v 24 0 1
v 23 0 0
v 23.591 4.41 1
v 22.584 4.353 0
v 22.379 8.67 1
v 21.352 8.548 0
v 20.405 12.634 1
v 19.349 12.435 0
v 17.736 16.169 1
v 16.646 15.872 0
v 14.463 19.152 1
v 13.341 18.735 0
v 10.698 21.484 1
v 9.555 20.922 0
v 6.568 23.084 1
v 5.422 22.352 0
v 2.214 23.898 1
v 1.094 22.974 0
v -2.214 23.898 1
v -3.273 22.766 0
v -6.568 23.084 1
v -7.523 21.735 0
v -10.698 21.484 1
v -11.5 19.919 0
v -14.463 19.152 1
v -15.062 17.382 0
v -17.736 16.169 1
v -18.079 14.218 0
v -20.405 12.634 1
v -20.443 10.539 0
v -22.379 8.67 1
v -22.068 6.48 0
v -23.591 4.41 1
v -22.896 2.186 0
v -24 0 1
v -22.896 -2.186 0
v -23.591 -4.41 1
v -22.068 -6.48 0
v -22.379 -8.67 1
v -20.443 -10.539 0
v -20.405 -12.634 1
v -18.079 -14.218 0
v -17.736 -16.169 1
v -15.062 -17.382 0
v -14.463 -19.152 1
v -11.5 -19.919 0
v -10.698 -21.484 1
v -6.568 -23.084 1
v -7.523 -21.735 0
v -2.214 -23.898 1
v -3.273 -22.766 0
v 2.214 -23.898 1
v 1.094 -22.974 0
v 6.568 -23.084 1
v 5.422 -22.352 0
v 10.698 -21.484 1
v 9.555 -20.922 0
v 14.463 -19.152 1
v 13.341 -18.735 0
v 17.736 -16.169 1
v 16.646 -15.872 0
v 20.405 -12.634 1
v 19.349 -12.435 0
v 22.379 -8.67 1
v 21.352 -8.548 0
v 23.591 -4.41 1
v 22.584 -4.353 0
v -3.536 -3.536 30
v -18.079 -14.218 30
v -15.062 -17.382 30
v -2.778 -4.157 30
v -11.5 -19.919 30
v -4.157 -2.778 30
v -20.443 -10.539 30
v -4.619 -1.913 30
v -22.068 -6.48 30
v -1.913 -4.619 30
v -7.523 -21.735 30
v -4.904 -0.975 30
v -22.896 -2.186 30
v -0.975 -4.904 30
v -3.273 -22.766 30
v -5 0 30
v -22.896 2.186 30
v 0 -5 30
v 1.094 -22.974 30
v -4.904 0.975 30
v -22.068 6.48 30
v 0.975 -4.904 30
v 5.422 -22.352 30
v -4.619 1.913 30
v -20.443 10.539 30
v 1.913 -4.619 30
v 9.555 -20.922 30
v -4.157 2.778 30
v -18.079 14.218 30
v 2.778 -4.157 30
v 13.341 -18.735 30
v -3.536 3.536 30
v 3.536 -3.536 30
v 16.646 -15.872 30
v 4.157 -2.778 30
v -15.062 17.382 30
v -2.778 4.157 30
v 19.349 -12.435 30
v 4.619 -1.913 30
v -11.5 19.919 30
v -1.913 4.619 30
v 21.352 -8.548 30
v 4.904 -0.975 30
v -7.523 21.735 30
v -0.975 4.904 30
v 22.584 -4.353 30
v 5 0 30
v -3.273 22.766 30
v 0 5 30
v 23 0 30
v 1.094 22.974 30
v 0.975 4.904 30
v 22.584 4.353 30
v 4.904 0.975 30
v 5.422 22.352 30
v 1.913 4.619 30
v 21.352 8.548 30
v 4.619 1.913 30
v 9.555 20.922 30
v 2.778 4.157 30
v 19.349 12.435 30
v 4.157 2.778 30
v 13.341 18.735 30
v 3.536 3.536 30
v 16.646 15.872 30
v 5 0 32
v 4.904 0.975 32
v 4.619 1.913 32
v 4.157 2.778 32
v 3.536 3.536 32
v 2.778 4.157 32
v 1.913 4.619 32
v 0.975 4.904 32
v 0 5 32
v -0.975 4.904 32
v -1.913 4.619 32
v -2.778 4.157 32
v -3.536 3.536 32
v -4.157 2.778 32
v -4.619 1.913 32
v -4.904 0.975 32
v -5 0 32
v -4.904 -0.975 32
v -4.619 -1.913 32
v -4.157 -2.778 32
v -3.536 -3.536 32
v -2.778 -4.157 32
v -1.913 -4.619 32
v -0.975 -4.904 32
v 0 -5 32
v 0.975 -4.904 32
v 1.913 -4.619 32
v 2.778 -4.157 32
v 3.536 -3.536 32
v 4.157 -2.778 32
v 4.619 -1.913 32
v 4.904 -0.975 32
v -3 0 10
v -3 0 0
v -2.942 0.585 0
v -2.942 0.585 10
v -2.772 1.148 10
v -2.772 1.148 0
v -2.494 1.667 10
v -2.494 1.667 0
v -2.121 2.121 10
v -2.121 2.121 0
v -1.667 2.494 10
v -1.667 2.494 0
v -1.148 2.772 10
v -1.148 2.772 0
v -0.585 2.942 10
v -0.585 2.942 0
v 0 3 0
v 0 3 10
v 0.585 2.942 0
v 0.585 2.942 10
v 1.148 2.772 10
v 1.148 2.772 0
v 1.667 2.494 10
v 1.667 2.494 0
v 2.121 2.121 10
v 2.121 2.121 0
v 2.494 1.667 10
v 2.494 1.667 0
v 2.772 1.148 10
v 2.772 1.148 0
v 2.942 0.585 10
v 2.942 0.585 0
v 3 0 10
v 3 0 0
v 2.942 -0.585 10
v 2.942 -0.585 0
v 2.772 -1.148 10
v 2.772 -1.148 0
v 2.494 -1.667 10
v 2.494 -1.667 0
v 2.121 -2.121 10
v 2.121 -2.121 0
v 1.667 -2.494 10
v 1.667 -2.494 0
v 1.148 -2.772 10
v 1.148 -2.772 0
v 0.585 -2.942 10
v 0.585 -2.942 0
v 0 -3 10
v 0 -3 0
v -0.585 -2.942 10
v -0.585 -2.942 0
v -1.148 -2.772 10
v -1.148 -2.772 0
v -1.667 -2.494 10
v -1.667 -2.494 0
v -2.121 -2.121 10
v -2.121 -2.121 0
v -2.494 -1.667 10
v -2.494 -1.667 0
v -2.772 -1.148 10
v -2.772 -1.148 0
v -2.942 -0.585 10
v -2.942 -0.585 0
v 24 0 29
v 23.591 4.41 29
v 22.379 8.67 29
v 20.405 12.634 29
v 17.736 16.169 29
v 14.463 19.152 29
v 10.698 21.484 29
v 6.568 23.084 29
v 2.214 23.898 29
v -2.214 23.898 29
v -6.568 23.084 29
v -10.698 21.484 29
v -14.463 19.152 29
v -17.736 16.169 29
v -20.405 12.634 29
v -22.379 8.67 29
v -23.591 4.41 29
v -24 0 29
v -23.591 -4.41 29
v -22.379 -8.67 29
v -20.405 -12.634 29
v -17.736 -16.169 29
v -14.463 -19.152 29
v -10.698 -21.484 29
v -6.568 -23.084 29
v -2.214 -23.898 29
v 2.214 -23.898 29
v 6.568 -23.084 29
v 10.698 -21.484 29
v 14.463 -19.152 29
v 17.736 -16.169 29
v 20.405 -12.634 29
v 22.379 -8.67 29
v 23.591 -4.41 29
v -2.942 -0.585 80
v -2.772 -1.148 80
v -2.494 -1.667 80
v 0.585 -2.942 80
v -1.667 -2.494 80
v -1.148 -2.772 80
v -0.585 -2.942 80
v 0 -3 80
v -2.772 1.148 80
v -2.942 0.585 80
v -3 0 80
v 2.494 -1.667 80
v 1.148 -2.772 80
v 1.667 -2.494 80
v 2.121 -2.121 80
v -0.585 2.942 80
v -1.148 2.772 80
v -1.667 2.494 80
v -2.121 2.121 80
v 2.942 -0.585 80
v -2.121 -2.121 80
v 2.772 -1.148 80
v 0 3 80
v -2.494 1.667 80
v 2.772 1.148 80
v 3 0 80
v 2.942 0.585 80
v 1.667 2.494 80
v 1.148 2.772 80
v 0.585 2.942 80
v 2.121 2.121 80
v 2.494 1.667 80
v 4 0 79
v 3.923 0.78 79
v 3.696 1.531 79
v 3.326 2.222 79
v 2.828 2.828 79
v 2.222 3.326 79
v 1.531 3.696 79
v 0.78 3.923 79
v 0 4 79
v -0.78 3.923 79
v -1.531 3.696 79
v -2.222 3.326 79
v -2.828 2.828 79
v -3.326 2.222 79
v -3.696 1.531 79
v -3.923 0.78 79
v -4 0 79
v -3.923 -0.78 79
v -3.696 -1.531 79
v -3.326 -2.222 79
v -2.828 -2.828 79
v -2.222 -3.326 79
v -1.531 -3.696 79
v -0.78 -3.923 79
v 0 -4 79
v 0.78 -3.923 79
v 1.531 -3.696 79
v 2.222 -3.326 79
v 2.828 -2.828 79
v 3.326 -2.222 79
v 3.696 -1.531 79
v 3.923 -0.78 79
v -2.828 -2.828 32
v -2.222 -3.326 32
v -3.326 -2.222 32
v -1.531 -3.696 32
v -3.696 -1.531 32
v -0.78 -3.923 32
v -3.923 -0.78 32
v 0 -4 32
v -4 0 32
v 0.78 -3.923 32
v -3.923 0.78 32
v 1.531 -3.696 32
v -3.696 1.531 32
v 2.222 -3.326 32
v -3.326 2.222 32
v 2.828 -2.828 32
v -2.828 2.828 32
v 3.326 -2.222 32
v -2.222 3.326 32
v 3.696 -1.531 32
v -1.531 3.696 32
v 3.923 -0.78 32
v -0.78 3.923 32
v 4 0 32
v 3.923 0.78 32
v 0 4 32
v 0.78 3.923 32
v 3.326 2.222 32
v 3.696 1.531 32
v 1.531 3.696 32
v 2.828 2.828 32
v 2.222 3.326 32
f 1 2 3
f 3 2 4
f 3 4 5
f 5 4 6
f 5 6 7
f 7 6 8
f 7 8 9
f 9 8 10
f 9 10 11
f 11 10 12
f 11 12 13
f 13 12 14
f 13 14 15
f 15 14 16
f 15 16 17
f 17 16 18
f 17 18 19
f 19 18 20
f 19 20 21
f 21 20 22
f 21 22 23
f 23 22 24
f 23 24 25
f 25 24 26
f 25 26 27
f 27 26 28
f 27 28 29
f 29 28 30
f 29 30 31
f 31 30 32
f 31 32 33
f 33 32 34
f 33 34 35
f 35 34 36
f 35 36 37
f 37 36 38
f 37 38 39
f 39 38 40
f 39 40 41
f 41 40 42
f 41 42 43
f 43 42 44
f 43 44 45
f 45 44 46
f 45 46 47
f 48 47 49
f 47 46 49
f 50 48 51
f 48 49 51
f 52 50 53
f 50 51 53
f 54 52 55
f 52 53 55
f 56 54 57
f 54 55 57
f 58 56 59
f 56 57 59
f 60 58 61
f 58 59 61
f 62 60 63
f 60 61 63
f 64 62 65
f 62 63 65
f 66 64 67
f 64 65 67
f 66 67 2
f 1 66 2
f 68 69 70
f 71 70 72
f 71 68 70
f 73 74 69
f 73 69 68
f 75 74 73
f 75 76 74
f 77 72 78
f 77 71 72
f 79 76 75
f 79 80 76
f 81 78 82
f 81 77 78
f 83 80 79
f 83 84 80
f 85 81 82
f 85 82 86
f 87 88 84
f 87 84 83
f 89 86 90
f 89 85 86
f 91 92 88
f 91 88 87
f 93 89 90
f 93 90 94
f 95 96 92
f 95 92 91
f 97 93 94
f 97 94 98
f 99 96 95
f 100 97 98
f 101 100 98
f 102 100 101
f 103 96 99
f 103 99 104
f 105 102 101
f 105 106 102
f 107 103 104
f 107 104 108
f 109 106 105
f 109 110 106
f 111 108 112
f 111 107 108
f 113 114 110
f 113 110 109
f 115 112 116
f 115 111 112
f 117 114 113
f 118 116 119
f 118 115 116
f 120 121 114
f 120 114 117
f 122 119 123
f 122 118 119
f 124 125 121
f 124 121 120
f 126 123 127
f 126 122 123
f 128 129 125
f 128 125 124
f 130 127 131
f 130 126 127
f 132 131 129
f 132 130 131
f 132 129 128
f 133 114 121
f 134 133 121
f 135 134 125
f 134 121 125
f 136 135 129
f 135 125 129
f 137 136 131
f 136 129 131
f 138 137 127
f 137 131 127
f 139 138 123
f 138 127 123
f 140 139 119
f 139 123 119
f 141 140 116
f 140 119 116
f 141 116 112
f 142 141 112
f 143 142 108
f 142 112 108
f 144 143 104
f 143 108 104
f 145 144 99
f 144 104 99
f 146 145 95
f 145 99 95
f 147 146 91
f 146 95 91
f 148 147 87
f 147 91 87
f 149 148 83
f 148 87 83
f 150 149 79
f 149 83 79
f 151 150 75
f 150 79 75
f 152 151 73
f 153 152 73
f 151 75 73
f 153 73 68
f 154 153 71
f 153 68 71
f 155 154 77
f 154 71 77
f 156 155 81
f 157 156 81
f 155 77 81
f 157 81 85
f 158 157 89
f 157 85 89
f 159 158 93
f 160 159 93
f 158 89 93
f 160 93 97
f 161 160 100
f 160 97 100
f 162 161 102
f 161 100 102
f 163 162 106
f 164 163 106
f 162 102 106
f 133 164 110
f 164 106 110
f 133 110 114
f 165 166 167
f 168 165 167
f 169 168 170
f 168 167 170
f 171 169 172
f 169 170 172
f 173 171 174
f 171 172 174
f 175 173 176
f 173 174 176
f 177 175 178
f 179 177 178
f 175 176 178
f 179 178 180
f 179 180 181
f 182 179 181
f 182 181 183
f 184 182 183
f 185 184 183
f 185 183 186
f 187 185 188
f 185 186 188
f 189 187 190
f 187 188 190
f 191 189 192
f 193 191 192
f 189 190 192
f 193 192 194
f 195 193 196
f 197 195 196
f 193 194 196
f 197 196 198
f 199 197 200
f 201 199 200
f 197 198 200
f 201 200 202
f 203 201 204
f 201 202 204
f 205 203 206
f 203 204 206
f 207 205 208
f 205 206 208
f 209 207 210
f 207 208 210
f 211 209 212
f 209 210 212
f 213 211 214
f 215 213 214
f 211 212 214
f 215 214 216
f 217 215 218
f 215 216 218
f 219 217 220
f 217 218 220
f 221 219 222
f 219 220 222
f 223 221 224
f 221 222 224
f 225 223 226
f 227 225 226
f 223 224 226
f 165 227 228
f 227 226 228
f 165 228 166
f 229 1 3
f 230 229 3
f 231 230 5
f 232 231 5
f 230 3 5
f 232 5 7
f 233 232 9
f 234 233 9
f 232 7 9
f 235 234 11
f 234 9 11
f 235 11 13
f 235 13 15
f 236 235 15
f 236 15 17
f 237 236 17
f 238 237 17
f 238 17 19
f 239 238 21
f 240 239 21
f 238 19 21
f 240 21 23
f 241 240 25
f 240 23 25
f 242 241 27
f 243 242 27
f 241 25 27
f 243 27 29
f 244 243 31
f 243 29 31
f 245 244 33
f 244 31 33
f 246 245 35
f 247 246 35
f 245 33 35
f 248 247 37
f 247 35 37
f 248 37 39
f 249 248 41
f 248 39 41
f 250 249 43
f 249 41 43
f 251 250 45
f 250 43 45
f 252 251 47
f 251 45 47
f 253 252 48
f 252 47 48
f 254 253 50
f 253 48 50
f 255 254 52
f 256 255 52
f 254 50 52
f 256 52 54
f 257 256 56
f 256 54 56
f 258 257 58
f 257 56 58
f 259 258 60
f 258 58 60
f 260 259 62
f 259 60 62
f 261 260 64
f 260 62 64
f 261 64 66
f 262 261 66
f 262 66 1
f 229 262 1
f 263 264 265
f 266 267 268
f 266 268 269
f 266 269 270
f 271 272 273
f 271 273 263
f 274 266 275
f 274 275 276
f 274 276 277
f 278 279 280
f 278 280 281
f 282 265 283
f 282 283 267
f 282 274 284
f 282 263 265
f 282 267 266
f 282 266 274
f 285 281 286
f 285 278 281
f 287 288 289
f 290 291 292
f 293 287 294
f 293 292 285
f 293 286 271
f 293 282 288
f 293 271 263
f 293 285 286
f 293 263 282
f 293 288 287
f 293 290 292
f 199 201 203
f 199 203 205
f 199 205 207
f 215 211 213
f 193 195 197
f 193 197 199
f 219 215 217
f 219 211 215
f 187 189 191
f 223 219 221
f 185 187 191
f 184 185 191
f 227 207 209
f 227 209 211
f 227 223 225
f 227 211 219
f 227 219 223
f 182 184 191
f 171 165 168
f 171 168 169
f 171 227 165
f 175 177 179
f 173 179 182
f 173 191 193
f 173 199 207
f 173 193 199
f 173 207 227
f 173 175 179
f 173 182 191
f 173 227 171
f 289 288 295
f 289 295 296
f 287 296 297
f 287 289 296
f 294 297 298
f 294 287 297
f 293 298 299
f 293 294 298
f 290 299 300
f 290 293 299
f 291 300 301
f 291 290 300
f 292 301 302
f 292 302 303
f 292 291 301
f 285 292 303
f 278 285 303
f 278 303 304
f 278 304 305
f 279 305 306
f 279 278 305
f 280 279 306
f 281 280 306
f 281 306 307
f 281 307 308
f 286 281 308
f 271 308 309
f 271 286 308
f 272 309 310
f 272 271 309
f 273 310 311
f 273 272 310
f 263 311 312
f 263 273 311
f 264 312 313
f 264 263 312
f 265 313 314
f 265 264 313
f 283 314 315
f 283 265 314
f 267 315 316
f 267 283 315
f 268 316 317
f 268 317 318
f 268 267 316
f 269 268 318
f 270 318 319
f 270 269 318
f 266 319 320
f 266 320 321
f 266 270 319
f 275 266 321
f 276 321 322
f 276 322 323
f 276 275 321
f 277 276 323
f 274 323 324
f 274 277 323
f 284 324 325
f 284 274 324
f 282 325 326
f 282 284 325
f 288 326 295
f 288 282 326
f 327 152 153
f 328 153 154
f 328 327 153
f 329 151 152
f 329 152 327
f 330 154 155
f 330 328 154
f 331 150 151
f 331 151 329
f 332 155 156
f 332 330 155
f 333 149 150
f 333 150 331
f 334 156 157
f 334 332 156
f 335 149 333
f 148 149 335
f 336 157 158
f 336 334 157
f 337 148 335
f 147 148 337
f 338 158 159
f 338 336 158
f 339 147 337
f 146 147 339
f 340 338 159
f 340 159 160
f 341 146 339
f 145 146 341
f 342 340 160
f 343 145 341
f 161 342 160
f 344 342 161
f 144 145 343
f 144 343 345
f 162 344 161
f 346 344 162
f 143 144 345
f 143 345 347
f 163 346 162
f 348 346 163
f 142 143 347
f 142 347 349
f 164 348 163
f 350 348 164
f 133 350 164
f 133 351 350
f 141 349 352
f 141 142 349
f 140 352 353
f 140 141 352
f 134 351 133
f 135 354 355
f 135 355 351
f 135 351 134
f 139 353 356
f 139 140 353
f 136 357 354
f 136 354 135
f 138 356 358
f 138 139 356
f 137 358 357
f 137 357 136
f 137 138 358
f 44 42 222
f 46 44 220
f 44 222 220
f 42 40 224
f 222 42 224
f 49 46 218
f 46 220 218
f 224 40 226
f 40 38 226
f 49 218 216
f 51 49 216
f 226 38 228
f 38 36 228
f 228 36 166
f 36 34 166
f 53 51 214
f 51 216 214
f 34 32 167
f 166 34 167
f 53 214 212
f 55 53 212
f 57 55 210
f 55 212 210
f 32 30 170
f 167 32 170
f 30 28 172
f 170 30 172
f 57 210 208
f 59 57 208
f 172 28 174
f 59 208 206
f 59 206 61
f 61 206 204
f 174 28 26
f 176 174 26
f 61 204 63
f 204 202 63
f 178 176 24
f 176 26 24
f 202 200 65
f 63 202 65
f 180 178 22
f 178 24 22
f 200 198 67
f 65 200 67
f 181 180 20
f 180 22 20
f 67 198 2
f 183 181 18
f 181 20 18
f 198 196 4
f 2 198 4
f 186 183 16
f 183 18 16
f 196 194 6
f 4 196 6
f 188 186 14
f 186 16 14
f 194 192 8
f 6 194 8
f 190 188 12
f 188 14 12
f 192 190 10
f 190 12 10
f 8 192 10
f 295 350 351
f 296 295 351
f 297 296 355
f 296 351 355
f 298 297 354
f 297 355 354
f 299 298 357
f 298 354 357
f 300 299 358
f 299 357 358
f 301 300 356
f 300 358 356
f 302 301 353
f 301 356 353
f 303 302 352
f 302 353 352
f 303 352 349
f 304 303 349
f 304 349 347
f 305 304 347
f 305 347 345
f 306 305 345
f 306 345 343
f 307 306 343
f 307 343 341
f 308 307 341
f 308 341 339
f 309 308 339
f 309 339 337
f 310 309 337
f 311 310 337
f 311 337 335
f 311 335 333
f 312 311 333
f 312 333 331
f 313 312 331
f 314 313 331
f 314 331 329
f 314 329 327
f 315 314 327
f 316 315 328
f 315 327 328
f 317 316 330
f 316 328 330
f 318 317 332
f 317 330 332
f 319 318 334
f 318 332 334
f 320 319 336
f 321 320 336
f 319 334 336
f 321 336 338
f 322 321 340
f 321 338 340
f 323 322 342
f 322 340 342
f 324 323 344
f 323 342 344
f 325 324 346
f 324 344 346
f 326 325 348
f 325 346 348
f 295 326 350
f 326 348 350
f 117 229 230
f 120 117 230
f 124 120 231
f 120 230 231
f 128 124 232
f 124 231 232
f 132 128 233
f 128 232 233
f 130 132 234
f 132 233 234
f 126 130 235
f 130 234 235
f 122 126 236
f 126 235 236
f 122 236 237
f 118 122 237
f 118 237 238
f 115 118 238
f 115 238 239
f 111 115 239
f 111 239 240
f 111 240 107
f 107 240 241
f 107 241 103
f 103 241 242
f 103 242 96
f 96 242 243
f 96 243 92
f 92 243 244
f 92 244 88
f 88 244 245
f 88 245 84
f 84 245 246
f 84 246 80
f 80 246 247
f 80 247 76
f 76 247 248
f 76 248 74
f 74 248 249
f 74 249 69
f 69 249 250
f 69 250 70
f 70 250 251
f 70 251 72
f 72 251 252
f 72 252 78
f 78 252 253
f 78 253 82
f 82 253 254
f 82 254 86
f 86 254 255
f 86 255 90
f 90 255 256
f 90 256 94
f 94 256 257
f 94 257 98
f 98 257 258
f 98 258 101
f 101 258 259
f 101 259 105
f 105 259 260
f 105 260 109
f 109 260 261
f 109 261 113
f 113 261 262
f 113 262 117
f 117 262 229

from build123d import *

# Parameters (mm, degrees)
ESQUISSE1_R             = 24
BOSS_EXTRU_1_DEPTH      = 30
ESQUISSE2_R             = 4
BOSS_EXTRU_2_DEPTH      = 50
ESQUISSE3_R             = 5
BOSS_EXTRU_3_DEPTH      = 2
ESQUISSE4_R             = 3
ENL_V_MAT_EXTRU_1_DEPTH = 10
CHANFREIN1_SIZE         = 1


with BuildPart() as part:
    # Esquisse1 → Boss.-Extru.1 (new body)
    with BuildSketch(Plane.XY):
        Circle(ESQUISSE1_R)
    extrude(amount=BOSS_EXTRU_1_DEPTH)

    # Esquisse2 → Boss.-Extru.2 (add)
    with BuildSketch(Plane.XY.offset(30)):
        Circle(ESQUISSE2_R)
    extrude(amount=BOSS_EXTRU_2_DEPTH)

    # Esquisse3 → Boss.-Extru.3 (add)
    with BuildSketch(Plane.XY.offset(30)):
        Circle(ESQUISSE3_R)
    extrude(amount=BOSS_EXTRU_3_DEPTH)

    # Esquisse4 → Enlèv. mat.-Extru.1 (cut)
    with BuildSketch(Plane(origin=(0, 0, 0), x_dir=(-1, 0, 0), z_dir=(0, 0, -1))):
        Circle(ESQUISSE4_R)
    extrude(amount=-ENL_V_MAT_EXTRU_1_DEPTH, mode=Mode.SUBTRACT)

    # Chanfrein1
    chanfrein1_edges = [part.edges().sort_by_distance(p)[0] for p in [
        (-24, 0, 0),
        (-24, 0, 30),
        (-4, 0, 80),
    ]]
    chamfer(chanfrein1_edges, length=CHANFREIN1_SIZE)


solid = part.part
